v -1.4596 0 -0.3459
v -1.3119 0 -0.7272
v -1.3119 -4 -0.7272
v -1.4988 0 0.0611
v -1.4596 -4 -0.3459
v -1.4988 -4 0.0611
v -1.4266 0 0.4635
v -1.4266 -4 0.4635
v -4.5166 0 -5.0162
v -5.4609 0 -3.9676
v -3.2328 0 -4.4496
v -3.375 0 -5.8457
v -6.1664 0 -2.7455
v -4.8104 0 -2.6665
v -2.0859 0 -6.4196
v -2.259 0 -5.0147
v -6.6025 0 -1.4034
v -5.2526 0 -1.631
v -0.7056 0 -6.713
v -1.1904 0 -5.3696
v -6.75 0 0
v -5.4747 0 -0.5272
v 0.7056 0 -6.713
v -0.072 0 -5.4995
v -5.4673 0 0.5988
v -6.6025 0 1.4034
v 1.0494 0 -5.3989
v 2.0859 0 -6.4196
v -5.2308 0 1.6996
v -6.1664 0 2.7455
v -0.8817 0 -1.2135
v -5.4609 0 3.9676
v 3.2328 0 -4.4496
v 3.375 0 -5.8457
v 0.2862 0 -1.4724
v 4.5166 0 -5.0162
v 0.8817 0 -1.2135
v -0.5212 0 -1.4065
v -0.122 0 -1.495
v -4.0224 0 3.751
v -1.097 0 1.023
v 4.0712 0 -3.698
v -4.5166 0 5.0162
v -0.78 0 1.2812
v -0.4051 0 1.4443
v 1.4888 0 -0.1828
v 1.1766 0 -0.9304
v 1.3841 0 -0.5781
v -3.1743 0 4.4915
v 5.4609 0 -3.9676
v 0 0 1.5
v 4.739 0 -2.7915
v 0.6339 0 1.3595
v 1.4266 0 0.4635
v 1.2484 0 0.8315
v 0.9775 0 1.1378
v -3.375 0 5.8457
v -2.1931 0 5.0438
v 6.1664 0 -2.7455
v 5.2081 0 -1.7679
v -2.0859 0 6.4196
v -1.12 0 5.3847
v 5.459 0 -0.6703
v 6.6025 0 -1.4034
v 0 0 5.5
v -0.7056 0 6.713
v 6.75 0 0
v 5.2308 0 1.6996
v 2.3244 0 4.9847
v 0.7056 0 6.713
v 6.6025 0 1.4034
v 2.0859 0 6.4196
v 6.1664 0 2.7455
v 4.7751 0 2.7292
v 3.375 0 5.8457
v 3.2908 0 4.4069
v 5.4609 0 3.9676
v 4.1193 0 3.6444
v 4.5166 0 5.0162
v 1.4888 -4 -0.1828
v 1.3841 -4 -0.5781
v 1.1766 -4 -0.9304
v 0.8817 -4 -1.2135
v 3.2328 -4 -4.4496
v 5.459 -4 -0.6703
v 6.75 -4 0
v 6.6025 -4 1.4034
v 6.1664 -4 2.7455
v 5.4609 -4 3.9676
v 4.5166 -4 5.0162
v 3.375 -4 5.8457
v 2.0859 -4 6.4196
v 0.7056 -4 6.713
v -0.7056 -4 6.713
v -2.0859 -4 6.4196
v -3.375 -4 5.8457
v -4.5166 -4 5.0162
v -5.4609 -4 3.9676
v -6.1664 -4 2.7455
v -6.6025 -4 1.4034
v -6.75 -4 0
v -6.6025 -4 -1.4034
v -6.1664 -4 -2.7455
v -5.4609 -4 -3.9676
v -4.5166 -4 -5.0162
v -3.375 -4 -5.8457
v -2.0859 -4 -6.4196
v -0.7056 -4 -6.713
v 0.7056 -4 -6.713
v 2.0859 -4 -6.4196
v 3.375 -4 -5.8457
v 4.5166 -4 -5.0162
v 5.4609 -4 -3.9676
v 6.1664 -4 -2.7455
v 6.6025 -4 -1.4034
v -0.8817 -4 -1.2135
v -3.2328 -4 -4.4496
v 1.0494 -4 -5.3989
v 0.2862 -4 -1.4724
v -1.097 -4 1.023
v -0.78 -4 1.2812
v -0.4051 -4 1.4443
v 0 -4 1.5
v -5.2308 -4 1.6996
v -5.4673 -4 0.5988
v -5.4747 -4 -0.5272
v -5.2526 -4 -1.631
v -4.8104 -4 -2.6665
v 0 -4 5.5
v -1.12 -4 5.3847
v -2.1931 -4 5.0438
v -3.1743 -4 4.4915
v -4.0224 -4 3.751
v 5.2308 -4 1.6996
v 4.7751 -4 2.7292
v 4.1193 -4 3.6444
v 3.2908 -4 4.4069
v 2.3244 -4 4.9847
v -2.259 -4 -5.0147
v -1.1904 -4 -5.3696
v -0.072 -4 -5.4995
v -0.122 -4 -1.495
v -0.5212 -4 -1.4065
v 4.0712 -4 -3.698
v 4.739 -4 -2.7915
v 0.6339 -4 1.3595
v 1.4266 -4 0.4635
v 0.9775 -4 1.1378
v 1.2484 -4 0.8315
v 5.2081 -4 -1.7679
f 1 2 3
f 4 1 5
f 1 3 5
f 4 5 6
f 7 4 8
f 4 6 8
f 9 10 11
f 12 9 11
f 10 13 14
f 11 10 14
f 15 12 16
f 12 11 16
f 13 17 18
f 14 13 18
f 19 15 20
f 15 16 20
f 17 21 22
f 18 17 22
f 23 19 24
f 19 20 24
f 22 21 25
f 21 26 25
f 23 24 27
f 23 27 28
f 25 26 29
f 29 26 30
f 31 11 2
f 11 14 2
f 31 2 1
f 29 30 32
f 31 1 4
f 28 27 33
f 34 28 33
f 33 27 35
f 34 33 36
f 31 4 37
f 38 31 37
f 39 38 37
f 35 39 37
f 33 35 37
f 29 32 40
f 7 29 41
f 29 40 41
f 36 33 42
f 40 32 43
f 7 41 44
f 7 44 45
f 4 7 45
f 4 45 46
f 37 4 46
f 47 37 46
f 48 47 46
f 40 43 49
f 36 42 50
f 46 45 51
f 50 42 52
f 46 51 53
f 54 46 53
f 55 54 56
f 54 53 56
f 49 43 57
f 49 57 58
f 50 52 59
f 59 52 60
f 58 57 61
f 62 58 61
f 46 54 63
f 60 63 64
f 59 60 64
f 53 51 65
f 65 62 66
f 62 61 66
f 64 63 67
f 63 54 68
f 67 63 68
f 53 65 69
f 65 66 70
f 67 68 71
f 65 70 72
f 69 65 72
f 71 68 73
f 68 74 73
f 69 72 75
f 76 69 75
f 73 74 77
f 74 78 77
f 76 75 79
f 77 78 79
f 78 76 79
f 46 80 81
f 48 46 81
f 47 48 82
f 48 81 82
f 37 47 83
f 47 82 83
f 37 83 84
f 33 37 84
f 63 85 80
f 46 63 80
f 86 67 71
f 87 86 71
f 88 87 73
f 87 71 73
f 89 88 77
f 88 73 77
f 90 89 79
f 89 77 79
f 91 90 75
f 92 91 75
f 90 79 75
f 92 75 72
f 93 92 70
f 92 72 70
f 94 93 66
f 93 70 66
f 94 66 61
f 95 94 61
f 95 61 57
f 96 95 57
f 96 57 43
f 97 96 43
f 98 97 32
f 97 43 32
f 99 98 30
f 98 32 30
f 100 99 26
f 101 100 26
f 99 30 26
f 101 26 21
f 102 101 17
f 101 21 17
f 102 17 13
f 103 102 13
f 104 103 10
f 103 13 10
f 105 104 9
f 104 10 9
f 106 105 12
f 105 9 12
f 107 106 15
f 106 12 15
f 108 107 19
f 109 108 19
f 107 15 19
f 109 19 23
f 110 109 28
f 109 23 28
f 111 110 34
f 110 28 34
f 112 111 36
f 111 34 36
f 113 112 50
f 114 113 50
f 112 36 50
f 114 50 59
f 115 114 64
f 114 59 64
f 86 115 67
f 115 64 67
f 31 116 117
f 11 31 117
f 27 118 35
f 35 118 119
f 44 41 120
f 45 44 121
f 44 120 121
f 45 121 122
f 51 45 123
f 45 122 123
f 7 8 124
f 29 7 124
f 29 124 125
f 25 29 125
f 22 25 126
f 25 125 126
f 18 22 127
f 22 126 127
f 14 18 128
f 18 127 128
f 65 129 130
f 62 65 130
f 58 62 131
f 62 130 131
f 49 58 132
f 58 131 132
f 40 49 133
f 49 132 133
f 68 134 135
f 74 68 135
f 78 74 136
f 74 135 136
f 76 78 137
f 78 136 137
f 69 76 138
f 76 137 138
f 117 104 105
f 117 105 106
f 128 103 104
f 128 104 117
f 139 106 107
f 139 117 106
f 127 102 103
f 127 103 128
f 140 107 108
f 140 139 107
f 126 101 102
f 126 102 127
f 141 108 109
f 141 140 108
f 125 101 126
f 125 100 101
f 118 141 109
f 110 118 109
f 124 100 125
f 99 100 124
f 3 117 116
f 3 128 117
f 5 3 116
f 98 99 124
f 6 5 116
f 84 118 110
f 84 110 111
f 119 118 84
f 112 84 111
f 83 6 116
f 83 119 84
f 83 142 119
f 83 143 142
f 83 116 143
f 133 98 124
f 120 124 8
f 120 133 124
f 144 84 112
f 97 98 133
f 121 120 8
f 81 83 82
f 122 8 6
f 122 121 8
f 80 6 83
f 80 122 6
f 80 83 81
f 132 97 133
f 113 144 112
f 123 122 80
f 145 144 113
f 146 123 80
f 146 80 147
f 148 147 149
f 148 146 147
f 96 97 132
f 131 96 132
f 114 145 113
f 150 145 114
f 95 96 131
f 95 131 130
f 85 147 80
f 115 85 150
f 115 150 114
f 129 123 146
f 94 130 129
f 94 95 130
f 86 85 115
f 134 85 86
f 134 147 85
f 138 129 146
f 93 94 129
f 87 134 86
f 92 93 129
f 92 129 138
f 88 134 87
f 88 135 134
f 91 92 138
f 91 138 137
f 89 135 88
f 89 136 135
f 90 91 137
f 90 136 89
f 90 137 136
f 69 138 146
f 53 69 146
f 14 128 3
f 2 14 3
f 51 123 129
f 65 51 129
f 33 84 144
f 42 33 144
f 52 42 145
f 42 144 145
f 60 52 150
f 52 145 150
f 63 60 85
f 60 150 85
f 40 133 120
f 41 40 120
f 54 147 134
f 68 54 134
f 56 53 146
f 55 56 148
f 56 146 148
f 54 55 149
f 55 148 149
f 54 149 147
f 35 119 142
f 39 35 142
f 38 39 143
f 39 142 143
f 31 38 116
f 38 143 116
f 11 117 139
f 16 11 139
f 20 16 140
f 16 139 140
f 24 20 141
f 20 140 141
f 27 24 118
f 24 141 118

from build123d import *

# Parameters (mm, degrees)
F0_R     = 6.75
F1_DEPTH = 4
F3_DEPTH = 25


with BuildPart() as f1:
    # F0 (on Front) → F1 (new body)
    with BuildSketch(Plane.XZ):
        Circle(F0_R)
    extrude(amount=F1_DEPTH)

    # F2 (on face) → F3 (cut)
    with BuildSketch(Plane.XZ.offset(4)):
        with BuildLine():
            Line((0, 1.5), (0, 5.5))
            ThreePointArc((0, 5.5), (-2.19312, 5.04383), (-4.022445, 3.750991))
            Line((-4.022445, 3.750991), (-1.097031, 1.022998))
            ThreePointArc((-1.097031, 1.022998), (-0.598124, 1.37559), (0, 1.5))
        make_face()
        with BuildLine():
            Line((1.426585, 0.463525), (5.230811, 1.699593))
            ThreePointArc((5.230811, 1.699593), (4.119256, 3.64441), (2.3244, 4.984693))
            Line((2.3244, 4.984693), (0.633927, 1.359462))
            ThreePointArc((0.633927, 1.359462), (1.123434, 0.99393), (1.426585, 0.463525))
        make_face()
        with BuildLine():
            ThreePointArc((3.232819, -4.449593), (4.73896, -2.791461), (5.459004, -0.670281))
            Line((5.459004, -0.670281), (1.488819, -0.182804))
            ThreePointArc((1.488819, -0.182804), (1.292444, -0.761308), (0.881678, -1.213525))
            Line((0.881678, -1.213525), (3.232819, -4.449593))
        make_face()
        with BuildLine():
            ThreePointArc((-3.232819, -4.449593), (-1.190418, -5.369628), (1.049449, -5.39895))
            Line((1.049449, -5.39895), (0.286213, -1.472441))
            ThreePointArc((0.286213, -1.472441), (-0.324659, -1.464444), (-0.881678, -1.213525))
            Line((-0.881678, -1.213525), (-3.232819, -4.449593))
        make_face()
        with BuildLine():
            Line((-1.426585, 0.463525), (-5.230811, 1.699593))
            ThreePointArc((-5.230811, 1.699593), (-5.474679, -0.527152), (-4.810408, -2.666453))
            Line((-4.810408, -2.666453), (-1.31193, -0.727214))
            ThreePointArc((-1.31193, -0.727214), (-1.493094, -0.143769), (-1.426585, 0.463525))
        make_face()
    extrude(amount=-F3_DEPTH, mode=Mode.SUBTRACT)


solid = f1.part
